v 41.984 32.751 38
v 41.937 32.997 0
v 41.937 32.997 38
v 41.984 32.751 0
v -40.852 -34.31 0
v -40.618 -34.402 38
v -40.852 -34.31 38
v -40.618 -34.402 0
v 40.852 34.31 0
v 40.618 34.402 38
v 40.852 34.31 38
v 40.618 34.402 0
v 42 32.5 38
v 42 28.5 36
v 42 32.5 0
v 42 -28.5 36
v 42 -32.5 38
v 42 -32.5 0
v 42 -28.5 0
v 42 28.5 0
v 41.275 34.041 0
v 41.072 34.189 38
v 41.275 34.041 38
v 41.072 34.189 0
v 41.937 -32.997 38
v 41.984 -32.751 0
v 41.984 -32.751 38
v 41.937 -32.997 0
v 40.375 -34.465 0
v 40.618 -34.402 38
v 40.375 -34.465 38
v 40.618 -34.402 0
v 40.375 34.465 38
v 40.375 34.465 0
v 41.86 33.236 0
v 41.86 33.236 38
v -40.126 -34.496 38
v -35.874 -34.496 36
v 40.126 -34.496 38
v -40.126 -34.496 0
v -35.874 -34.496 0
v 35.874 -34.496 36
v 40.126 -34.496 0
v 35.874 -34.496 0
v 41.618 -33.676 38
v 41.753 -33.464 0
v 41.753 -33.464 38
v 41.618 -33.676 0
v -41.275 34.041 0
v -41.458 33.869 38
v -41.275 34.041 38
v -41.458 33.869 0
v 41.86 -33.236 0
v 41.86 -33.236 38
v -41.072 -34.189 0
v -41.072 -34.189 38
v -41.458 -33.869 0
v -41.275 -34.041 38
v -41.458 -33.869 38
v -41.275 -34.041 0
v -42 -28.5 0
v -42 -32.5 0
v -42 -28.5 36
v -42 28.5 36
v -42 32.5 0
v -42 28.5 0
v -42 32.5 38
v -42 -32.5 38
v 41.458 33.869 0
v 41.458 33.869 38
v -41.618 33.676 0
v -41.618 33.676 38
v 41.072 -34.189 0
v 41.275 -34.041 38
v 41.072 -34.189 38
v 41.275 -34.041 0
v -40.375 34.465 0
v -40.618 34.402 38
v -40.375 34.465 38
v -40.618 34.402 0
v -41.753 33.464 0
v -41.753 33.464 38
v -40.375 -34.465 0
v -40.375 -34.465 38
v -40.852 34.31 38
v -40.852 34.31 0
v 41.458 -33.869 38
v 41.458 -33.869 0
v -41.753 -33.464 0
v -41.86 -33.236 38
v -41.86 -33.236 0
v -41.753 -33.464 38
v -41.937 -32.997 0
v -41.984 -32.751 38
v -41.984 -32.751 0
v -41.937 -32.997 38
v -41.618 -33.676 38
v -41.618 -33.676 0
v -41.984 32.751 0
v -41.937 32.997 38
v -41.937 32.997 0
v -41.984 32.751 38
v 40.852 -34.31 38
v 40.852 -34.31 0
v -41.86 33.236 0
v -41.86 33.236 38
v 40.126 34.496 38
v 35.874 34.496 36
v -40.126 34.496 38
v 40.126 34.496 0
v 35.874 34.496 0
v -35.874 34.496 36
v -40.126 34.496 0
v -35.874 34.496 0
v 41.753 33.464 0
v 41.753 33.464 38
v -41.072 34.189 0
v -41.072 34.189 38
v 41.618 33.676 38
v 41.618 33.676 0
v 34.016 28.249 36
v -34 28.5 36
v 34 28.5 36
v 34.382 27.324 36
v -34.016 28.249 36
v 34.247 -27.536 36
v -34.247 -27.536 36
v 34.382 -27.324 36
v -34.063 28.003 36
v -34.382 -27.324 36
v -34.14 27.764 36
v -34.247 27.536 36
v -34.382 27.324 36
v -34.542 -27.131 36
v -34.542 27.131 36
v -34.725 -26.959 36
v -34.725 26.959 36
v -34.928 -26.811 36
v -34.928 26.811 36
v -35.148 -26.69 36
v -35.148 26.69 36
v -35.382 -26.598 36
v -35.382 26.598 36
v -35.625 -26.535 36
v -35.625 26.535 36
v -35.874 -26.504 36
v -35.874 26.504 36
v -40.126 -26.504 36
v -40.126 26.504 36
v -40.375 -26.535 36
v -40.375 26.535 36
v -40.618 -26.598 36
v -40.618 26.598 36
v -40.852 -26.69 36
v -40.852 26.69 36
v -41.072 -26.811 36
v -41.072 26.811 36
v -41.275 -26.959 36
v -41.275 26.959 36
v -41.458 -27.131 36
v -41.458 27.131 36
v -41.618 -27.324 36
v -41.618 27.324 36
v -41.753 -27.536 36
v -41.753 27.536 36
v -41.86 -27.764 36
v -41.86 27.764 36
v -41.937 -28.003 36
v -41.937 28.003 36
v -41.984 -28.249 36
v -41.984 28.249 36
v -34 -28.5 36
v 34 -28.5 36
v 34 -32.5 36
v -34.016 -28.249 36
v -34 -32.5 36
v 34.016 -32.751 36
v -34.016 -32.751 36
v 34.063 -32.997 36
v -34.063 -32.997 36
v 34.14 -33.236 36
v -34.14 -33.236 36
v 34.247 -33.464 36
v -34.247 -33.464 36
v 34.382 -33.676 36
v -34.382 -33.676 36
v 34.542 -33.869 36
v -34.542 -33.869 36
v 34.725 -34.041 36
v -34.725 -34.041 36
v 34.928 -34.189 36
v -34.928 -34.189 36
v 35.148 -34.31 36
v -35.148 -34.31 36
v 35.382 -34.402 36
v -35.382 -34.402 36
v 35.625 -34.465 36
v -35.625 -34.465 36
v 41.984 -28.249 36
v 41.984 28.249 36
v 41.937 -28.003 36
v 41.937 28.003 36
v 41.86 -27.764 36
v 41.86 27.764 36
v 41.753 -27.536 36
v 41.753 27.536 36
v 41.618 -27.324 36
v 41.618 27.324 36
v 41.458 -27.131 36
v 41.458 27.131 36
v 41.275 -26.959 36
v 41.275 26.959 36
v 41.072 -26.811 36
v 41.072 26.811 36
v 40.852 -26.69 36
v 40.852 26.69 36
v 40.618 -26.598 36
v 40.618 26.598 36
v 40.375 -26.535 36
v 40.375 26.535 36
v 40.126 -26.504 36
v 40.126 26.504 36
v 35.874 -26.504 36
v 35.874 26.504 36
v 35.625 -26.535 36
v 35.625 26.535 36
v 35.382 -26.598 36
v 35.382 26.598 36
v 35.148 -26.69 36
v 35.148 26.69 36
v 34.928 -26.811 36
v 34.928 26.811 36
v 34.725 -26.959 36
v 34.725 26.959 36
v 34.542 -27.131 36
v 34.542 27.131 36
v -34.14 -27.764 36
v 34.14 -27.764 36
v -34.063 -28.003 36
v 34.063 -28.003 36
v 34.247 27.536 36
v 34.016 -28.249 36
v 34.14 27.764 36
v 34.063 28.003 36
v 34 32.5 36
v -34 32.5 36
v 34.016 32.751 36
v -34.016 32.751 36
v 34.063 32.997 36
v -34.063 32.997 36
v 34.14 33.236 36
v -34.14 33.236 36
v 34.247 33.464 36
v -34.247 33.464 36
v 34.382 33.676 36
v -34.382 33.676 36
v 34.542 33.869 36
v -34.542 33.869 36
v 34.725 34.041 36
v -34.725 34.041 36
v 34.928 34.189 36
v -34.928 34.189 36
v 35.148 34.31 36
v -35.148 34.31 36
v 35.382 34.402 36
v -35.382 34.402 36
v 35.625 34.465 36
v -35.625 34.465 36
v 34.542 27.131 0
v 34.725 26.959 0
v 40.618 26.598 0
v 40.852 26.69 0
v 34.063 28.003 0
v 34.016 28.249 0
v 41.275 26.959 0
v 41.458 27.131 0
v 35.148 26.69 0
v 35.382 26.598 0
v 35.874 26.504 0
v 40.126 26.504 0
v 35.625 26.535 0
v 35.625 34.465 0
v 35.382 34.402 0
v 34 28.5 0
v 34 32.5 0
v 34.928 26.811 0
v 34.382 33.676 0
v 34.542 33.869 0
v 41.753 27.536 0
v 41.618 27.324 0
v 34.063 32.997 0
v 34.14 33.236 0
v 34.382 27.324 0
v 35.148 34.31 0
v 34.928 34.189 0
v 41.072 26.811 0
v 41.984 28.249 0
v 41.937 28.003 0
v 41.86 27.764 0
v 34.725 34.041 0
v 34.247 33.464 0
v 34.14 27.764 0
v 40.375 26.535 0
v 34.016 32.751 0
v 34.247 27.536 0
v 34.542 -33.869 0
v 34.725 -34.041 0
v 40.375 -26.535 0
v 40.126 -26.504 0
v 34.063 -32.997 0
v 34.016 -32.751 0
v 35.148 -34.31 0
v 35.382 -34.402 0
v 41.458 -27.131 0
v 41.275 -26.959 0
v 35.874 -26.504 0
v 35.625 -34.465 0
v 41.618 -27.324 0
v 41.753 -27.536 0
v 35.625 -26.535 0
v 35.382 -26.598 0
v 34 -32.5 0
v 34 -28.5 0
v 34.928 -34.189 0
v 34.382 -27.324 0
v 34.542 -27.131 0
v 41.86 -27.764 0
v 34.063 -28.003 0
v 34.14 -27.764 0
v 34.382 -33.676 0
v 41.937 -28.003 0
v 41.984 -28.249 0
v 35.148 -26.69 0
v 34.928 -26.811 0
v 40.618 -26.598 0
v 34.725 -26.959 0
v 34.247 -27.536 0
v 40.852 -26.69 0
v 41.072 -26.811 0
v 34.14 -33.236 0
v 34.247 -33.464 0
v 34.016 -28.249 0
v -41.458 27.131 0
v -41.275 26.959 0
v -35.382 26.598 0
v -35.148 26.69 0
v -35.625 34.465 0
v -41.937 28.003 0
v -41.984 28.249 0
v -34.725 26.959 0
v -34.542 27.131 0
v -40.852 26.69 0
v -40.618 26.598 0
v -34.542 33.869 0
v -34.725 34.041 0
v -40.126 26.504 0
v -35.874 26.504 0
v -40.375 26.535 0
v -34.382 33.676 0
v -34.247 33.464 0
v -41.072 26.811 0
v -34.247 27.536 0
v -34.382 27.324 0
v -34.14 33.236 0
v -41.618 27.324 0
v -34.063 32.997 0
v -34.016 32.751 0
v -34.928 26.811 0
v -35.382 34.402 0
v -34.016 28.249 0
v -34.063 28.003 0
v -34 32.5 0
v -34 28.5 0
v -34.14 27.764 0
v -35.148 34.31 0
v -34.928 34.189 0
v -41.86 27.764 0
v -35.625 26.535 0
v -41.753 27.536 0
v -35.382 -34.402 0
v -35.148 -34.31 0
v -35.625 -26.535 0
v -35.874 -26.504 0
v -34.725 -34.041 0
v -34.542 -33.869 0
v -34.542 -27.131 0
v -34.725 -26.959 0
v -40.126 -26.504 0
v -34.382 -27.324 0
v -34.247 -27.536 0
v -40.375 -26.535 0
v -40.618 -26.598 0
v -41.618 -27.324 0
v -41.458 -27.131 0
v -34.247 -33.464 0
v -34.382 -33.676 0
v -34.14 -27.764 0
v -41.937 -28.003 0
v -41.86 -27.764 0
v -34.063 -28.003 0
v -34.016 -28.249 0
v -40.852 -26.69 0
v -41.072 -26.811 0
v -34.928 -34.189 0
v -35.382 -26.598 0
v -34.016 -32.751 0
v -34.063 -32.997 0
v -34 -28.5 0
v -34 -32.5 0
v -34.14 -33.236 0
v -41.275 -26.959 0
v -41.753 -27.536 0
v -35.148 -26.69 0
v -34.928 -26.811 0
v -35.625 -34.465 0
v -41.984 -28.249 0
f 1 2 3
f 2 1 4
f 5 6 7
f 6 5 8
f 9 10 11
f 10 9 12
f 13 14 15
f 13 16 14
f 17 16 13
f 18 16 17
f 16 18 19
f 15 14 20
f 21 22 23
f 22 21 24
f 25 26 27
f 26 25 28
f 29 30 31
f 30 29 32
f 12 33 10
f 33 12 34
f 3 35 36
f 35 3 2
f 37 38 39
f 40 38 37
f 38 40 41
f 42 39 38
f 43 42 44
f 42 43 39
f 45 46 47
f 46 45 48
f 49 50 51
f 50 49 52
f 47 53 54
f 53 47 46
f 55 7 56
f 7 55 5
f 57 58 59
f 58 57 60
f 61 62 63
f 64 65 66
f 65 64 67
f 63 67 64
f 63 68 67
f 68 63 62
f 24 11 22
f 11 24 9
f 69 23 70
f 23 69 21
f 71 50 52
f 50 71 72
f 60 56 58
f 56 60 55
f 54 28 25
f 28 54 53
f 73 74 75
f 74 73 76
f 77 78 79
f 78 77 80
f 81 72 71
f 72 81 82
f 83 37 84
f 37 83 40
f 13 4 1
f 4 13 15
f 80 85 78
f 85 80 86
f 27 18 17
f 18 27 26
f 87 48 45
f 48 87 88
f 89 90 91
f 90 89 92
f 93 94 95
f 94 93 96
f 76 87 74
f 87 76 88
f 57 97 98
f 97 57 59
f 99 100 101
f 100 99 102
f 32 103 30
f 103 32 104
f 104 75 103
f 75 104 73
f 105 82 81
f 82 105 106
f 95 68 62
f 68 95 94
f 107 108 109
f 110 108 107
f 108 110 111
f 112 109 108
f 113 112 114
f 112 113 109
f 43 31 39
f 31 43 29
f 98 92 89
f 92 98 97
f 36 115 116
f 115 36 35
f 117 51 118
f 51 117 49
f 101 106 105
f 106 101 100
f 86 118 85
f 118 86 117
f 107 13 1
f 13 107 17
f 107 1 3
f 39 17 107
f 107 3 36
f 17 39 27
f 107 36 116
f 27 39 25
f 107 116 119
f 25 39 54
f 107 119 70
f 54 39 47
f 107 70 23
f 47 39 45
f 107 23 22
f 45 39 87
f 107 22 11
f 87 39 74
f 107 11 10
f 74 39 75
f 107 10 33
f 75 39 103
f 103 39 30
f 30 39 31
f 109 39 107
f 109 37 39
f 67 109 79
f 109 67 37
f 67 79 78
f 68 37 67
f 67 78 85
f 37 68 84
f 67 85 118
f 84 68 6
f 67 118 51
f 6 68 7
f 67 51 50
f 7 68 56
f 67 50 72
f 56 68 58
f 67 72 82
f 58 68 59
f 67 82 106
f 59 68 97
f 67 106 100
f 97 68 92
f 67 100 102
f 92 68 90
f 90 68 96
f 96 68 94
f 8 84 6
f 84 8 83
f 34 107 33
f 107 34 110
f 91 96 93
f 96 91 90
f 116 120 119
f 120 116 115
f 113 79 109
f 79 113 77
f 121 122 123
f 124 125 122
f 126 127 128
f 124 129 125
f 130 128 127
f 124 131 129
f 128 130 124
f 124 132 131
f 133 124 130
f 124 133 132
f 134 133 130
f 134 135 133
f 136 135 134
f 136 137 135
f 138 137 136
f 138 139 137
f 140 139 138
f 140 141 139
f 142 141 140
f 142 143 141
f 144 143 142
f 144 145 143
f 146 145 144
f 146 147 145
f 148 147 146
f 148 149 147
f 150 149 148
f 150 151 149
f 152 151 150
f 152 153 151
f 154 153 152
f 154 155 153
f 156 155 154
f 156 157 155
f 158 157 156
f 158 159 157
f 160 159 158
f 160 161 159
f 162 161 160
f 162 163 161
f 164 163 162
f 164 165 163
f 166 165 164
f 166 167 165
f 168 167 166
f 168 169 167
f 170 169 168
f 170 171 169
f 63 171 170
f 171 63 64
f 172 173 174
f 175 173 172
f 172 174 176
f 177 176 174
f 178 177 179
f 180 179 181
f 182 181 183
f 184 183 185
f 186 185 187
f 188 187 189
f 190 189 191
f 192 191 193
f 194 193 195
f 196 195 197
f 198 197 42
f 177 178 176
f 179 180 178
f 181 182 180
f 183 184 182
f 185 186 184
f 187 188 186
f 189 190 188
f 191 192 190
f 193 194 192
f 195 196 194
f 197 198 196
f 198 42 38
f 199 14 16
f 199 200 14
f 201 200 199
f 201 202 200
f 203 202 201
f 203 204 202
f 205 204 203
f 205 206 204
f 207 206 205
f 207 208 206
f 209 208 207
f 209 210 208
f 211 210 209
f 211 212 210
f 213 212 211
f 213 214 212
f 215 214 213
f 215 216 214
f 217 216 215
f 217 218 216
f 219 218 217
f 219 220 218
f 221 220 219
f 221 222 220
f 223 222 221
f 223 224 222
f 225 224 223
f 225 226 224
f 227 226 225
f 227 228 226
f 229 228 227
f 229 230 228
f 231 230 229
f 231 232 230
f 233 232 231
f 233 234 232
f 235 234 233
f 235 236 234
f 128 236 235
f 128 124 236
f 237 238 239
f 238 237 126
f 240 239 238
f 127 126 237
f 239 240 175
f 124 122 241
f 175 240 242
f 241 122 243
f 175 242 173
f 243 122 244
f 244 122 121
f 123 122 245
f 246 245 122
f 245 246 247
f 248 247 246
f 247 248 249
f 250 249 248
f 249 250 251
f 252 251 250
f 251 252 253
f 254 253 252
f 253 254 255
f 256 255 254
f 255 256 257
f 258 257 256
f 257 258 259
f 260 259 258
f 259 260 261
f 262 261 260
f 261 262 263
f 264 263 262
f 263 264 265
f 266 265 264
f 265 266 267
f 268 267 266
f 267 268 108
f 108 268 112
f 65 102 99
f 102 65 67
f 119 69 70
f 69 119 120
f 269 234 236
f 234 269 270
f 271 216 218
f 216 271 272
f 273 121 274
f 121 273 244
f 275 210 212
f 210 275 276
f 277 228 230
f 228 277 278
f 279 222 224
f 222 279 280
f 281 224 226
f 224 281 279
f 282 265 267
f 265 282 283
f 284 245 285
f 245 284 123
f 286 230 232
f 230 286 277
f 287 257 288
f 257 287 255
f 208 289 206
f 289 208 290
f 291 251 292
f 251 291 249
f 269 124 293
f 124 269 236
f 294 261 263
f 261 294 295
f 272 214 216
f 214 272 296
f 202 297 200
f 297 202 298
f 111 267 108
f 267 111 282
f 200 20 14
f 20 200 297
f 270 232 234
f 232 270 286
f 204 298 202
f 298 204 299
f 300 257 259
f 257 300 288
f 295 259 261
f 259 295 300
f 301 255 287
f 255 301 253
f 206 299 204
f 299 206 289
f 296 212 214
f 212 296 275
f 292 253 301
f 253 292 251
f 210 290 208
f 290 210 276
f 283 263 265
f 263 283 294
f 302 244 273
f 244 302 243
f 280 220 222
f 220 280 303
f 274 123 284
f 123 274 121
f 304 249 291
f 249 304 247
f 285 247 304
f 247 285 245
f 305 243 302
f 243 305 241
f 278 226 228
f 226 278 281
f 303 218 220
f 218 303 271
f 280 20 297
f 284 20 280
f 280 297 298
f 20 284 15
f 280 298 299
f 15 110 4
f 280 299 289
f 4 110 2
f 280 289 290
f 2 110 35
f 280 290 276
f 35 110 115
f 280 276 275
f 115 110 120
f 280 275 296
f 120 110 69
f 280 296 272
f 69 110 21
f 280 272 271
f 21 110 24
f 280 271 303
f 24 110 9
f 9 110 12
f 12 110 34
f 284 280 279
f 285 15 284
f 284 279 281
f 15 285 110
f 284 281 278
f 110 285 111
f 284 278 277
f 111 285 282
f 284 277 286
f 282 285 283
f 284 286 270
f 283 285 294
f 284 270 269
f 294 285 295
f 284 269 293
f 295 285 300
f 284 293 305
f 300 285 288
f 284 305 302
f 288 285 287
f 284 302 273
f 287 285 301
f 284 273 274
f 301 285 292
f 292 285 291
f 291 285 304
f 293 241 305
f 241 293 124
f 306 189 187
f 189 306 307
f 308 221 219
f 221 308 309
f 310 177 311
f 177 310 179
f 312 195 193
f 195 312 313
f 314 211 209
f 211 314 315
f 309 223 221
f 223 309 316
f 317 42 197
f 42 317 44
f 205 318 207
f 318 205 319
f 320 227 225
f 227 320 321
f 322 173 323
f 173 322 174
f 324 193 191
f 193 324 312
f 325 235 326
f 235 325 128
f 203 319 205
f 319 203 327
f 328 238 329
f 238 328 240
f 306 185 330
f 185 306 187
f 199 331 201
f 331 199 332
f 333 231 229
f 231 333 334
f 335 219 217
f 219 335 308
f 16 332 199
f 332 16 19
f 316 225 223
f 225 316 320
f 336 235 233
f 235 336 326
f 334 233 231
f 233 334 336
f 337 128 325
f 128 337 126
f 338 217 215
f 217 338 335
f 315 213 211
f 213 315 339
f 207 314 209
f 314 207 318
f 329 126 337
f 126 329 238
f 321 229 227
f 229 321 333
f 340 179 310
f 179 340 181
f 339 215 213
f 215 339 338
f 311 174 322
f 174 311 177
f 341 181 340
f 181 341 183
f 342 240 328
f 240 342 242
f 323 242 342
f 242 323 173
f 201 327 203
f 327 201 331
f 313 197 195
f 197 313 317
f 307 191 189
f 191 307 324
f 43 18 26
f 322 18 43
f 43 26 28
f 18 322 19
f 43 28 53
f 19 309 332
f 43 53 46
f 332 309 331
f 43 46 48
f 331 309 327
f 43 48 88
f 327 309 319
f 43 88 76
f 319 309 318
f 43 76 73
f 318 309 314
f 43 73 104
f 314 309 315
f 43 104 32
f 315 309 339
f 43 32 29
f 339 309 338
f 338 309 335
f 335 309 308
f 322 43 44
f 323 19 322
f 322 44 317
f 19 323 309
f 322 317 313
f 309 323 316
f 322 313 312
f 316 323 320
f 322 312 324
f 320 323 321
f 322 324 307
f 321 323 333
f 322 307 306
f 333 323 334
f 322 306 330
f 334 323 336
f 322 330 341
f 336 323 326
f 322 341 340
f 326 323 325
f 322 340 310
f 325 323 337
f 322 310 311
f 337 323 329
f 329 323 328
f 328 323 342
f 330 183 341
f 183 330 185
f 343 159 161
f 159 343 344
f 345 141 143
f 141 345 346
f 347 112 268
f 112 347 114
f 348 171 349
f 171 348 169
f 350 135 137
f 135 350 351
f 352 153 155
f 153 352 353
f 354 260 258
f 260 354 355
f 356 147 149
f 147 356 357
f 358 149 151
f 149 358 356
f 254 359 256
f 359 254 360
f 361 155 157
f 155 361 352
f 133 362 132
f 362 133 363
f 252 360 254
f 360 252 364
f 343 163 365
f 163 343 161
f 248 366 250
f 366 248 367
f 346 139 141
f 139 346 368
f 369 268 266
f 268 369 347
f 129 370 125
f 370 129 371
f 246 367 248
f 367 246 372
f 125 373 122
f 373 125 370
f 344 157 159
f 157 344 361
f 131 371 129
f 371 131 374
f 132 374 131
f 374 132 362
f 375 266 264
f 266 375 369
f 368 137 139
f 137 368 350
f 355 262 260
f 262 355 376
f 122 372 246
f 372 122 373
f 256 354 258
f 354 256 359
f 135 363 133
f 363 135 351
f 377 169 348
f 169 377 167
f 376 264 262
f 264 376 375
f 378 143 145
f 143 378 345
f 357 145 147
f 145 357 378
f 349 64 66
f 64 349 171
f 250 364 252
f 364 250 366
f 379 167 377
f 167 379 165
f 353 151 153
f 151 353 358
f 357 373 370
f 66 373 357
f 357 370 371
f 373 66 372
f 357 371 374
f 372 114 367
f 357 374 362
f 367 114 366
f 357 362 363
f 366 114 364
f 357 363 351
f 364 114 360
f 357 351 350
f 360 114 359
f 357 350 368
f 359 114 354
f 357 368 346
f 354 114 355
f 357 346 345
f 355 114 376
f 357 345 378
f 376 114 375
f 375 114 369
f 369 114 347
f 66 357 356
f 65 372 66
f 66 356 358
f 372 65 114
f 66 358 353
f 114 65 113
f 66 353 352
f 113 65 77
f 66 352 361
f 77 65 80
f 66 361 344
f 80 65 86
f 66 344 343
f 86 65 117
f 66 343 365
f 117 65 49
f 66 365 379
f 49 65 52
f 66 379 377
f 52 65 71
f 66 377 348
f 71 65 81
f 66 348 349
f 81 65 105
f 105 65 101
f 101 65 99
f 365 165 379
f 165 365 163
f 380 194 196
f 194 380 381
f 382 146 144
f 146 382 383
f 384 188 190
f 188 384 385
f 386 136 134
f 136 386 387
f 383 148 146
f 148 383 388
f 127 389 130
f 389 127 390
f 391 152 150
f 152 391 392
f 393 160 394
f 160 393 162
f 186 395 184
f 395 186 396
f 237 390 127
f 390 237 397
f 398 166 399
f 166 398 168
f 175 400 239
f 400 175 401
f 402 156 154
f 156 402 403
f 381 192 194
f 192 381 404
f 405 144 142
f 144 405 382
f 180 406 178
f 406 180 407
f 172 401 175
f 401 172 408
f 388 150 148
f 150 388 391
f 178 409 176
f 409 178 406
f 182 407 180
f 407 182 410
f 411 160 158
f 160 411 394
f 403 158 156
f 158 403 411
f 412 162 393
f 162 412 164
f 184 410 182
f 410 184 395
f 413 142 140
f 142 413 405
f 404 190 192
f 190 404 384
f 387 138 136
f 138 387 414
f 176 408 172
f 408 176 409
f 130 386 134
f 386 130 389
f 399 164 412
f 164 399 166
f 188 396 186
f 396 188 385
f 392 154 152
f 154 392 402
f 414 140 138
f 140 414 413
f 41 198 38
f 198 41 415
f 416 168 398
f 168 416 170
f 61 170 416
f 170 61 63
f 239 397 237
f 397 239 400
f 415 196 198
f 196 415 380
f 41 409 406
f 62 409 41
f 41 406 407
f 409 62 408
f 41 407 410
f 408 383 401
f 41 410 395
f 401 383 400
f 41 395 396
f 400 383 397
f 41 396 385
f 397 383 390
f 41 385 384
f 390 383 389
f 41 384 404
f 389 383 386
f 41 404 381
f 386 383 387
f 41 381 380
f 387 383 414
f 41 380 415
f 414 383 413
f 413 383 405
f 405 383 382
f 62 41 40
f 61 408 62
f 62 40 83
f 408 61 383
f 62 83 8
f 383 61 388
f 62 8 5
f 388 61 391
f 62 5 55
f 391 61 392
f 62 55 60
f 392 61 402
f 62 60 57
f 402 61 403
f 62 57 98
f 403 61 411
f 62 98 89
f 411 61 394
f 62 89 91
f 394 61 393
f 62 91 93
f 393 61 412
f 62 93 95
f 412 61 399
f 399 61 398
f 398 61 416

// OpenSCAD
//Loguncov Maxim 19.12.13

table_x = 80;
table_y = 65;
table_z = 1;
leg_xy = 4;
leg_height = 36;
rounding_cylinder_r = 2;


$fn=50;


module leg() {
	translate([0,0,leg_height/2])

		minkowski() {
			cube([leg_xy,leg_xy,leg_height],center=true);
			cylinder(r=rounding_cylinder_r,h=table_z);
		}



}

translate([-table_x/2,-table_y/2,leg_height]) 
	minkowski() {
		cube([table_x,table_y,table_z]);
		cylinder(r=rounding_cylinder_r,h=table_z);
	}

x1 = table_x/2-leg_xy/2;
x2 = -x1;
y1 = table_y/2-leg_xy/2;
y2 = -y1;

translate([x1,y1,0])
	leg();
translate([x1,y2,0])
	leg();
translate([x2,y1,0])
	leg();
translate([x2,y2,0])
	leg();
